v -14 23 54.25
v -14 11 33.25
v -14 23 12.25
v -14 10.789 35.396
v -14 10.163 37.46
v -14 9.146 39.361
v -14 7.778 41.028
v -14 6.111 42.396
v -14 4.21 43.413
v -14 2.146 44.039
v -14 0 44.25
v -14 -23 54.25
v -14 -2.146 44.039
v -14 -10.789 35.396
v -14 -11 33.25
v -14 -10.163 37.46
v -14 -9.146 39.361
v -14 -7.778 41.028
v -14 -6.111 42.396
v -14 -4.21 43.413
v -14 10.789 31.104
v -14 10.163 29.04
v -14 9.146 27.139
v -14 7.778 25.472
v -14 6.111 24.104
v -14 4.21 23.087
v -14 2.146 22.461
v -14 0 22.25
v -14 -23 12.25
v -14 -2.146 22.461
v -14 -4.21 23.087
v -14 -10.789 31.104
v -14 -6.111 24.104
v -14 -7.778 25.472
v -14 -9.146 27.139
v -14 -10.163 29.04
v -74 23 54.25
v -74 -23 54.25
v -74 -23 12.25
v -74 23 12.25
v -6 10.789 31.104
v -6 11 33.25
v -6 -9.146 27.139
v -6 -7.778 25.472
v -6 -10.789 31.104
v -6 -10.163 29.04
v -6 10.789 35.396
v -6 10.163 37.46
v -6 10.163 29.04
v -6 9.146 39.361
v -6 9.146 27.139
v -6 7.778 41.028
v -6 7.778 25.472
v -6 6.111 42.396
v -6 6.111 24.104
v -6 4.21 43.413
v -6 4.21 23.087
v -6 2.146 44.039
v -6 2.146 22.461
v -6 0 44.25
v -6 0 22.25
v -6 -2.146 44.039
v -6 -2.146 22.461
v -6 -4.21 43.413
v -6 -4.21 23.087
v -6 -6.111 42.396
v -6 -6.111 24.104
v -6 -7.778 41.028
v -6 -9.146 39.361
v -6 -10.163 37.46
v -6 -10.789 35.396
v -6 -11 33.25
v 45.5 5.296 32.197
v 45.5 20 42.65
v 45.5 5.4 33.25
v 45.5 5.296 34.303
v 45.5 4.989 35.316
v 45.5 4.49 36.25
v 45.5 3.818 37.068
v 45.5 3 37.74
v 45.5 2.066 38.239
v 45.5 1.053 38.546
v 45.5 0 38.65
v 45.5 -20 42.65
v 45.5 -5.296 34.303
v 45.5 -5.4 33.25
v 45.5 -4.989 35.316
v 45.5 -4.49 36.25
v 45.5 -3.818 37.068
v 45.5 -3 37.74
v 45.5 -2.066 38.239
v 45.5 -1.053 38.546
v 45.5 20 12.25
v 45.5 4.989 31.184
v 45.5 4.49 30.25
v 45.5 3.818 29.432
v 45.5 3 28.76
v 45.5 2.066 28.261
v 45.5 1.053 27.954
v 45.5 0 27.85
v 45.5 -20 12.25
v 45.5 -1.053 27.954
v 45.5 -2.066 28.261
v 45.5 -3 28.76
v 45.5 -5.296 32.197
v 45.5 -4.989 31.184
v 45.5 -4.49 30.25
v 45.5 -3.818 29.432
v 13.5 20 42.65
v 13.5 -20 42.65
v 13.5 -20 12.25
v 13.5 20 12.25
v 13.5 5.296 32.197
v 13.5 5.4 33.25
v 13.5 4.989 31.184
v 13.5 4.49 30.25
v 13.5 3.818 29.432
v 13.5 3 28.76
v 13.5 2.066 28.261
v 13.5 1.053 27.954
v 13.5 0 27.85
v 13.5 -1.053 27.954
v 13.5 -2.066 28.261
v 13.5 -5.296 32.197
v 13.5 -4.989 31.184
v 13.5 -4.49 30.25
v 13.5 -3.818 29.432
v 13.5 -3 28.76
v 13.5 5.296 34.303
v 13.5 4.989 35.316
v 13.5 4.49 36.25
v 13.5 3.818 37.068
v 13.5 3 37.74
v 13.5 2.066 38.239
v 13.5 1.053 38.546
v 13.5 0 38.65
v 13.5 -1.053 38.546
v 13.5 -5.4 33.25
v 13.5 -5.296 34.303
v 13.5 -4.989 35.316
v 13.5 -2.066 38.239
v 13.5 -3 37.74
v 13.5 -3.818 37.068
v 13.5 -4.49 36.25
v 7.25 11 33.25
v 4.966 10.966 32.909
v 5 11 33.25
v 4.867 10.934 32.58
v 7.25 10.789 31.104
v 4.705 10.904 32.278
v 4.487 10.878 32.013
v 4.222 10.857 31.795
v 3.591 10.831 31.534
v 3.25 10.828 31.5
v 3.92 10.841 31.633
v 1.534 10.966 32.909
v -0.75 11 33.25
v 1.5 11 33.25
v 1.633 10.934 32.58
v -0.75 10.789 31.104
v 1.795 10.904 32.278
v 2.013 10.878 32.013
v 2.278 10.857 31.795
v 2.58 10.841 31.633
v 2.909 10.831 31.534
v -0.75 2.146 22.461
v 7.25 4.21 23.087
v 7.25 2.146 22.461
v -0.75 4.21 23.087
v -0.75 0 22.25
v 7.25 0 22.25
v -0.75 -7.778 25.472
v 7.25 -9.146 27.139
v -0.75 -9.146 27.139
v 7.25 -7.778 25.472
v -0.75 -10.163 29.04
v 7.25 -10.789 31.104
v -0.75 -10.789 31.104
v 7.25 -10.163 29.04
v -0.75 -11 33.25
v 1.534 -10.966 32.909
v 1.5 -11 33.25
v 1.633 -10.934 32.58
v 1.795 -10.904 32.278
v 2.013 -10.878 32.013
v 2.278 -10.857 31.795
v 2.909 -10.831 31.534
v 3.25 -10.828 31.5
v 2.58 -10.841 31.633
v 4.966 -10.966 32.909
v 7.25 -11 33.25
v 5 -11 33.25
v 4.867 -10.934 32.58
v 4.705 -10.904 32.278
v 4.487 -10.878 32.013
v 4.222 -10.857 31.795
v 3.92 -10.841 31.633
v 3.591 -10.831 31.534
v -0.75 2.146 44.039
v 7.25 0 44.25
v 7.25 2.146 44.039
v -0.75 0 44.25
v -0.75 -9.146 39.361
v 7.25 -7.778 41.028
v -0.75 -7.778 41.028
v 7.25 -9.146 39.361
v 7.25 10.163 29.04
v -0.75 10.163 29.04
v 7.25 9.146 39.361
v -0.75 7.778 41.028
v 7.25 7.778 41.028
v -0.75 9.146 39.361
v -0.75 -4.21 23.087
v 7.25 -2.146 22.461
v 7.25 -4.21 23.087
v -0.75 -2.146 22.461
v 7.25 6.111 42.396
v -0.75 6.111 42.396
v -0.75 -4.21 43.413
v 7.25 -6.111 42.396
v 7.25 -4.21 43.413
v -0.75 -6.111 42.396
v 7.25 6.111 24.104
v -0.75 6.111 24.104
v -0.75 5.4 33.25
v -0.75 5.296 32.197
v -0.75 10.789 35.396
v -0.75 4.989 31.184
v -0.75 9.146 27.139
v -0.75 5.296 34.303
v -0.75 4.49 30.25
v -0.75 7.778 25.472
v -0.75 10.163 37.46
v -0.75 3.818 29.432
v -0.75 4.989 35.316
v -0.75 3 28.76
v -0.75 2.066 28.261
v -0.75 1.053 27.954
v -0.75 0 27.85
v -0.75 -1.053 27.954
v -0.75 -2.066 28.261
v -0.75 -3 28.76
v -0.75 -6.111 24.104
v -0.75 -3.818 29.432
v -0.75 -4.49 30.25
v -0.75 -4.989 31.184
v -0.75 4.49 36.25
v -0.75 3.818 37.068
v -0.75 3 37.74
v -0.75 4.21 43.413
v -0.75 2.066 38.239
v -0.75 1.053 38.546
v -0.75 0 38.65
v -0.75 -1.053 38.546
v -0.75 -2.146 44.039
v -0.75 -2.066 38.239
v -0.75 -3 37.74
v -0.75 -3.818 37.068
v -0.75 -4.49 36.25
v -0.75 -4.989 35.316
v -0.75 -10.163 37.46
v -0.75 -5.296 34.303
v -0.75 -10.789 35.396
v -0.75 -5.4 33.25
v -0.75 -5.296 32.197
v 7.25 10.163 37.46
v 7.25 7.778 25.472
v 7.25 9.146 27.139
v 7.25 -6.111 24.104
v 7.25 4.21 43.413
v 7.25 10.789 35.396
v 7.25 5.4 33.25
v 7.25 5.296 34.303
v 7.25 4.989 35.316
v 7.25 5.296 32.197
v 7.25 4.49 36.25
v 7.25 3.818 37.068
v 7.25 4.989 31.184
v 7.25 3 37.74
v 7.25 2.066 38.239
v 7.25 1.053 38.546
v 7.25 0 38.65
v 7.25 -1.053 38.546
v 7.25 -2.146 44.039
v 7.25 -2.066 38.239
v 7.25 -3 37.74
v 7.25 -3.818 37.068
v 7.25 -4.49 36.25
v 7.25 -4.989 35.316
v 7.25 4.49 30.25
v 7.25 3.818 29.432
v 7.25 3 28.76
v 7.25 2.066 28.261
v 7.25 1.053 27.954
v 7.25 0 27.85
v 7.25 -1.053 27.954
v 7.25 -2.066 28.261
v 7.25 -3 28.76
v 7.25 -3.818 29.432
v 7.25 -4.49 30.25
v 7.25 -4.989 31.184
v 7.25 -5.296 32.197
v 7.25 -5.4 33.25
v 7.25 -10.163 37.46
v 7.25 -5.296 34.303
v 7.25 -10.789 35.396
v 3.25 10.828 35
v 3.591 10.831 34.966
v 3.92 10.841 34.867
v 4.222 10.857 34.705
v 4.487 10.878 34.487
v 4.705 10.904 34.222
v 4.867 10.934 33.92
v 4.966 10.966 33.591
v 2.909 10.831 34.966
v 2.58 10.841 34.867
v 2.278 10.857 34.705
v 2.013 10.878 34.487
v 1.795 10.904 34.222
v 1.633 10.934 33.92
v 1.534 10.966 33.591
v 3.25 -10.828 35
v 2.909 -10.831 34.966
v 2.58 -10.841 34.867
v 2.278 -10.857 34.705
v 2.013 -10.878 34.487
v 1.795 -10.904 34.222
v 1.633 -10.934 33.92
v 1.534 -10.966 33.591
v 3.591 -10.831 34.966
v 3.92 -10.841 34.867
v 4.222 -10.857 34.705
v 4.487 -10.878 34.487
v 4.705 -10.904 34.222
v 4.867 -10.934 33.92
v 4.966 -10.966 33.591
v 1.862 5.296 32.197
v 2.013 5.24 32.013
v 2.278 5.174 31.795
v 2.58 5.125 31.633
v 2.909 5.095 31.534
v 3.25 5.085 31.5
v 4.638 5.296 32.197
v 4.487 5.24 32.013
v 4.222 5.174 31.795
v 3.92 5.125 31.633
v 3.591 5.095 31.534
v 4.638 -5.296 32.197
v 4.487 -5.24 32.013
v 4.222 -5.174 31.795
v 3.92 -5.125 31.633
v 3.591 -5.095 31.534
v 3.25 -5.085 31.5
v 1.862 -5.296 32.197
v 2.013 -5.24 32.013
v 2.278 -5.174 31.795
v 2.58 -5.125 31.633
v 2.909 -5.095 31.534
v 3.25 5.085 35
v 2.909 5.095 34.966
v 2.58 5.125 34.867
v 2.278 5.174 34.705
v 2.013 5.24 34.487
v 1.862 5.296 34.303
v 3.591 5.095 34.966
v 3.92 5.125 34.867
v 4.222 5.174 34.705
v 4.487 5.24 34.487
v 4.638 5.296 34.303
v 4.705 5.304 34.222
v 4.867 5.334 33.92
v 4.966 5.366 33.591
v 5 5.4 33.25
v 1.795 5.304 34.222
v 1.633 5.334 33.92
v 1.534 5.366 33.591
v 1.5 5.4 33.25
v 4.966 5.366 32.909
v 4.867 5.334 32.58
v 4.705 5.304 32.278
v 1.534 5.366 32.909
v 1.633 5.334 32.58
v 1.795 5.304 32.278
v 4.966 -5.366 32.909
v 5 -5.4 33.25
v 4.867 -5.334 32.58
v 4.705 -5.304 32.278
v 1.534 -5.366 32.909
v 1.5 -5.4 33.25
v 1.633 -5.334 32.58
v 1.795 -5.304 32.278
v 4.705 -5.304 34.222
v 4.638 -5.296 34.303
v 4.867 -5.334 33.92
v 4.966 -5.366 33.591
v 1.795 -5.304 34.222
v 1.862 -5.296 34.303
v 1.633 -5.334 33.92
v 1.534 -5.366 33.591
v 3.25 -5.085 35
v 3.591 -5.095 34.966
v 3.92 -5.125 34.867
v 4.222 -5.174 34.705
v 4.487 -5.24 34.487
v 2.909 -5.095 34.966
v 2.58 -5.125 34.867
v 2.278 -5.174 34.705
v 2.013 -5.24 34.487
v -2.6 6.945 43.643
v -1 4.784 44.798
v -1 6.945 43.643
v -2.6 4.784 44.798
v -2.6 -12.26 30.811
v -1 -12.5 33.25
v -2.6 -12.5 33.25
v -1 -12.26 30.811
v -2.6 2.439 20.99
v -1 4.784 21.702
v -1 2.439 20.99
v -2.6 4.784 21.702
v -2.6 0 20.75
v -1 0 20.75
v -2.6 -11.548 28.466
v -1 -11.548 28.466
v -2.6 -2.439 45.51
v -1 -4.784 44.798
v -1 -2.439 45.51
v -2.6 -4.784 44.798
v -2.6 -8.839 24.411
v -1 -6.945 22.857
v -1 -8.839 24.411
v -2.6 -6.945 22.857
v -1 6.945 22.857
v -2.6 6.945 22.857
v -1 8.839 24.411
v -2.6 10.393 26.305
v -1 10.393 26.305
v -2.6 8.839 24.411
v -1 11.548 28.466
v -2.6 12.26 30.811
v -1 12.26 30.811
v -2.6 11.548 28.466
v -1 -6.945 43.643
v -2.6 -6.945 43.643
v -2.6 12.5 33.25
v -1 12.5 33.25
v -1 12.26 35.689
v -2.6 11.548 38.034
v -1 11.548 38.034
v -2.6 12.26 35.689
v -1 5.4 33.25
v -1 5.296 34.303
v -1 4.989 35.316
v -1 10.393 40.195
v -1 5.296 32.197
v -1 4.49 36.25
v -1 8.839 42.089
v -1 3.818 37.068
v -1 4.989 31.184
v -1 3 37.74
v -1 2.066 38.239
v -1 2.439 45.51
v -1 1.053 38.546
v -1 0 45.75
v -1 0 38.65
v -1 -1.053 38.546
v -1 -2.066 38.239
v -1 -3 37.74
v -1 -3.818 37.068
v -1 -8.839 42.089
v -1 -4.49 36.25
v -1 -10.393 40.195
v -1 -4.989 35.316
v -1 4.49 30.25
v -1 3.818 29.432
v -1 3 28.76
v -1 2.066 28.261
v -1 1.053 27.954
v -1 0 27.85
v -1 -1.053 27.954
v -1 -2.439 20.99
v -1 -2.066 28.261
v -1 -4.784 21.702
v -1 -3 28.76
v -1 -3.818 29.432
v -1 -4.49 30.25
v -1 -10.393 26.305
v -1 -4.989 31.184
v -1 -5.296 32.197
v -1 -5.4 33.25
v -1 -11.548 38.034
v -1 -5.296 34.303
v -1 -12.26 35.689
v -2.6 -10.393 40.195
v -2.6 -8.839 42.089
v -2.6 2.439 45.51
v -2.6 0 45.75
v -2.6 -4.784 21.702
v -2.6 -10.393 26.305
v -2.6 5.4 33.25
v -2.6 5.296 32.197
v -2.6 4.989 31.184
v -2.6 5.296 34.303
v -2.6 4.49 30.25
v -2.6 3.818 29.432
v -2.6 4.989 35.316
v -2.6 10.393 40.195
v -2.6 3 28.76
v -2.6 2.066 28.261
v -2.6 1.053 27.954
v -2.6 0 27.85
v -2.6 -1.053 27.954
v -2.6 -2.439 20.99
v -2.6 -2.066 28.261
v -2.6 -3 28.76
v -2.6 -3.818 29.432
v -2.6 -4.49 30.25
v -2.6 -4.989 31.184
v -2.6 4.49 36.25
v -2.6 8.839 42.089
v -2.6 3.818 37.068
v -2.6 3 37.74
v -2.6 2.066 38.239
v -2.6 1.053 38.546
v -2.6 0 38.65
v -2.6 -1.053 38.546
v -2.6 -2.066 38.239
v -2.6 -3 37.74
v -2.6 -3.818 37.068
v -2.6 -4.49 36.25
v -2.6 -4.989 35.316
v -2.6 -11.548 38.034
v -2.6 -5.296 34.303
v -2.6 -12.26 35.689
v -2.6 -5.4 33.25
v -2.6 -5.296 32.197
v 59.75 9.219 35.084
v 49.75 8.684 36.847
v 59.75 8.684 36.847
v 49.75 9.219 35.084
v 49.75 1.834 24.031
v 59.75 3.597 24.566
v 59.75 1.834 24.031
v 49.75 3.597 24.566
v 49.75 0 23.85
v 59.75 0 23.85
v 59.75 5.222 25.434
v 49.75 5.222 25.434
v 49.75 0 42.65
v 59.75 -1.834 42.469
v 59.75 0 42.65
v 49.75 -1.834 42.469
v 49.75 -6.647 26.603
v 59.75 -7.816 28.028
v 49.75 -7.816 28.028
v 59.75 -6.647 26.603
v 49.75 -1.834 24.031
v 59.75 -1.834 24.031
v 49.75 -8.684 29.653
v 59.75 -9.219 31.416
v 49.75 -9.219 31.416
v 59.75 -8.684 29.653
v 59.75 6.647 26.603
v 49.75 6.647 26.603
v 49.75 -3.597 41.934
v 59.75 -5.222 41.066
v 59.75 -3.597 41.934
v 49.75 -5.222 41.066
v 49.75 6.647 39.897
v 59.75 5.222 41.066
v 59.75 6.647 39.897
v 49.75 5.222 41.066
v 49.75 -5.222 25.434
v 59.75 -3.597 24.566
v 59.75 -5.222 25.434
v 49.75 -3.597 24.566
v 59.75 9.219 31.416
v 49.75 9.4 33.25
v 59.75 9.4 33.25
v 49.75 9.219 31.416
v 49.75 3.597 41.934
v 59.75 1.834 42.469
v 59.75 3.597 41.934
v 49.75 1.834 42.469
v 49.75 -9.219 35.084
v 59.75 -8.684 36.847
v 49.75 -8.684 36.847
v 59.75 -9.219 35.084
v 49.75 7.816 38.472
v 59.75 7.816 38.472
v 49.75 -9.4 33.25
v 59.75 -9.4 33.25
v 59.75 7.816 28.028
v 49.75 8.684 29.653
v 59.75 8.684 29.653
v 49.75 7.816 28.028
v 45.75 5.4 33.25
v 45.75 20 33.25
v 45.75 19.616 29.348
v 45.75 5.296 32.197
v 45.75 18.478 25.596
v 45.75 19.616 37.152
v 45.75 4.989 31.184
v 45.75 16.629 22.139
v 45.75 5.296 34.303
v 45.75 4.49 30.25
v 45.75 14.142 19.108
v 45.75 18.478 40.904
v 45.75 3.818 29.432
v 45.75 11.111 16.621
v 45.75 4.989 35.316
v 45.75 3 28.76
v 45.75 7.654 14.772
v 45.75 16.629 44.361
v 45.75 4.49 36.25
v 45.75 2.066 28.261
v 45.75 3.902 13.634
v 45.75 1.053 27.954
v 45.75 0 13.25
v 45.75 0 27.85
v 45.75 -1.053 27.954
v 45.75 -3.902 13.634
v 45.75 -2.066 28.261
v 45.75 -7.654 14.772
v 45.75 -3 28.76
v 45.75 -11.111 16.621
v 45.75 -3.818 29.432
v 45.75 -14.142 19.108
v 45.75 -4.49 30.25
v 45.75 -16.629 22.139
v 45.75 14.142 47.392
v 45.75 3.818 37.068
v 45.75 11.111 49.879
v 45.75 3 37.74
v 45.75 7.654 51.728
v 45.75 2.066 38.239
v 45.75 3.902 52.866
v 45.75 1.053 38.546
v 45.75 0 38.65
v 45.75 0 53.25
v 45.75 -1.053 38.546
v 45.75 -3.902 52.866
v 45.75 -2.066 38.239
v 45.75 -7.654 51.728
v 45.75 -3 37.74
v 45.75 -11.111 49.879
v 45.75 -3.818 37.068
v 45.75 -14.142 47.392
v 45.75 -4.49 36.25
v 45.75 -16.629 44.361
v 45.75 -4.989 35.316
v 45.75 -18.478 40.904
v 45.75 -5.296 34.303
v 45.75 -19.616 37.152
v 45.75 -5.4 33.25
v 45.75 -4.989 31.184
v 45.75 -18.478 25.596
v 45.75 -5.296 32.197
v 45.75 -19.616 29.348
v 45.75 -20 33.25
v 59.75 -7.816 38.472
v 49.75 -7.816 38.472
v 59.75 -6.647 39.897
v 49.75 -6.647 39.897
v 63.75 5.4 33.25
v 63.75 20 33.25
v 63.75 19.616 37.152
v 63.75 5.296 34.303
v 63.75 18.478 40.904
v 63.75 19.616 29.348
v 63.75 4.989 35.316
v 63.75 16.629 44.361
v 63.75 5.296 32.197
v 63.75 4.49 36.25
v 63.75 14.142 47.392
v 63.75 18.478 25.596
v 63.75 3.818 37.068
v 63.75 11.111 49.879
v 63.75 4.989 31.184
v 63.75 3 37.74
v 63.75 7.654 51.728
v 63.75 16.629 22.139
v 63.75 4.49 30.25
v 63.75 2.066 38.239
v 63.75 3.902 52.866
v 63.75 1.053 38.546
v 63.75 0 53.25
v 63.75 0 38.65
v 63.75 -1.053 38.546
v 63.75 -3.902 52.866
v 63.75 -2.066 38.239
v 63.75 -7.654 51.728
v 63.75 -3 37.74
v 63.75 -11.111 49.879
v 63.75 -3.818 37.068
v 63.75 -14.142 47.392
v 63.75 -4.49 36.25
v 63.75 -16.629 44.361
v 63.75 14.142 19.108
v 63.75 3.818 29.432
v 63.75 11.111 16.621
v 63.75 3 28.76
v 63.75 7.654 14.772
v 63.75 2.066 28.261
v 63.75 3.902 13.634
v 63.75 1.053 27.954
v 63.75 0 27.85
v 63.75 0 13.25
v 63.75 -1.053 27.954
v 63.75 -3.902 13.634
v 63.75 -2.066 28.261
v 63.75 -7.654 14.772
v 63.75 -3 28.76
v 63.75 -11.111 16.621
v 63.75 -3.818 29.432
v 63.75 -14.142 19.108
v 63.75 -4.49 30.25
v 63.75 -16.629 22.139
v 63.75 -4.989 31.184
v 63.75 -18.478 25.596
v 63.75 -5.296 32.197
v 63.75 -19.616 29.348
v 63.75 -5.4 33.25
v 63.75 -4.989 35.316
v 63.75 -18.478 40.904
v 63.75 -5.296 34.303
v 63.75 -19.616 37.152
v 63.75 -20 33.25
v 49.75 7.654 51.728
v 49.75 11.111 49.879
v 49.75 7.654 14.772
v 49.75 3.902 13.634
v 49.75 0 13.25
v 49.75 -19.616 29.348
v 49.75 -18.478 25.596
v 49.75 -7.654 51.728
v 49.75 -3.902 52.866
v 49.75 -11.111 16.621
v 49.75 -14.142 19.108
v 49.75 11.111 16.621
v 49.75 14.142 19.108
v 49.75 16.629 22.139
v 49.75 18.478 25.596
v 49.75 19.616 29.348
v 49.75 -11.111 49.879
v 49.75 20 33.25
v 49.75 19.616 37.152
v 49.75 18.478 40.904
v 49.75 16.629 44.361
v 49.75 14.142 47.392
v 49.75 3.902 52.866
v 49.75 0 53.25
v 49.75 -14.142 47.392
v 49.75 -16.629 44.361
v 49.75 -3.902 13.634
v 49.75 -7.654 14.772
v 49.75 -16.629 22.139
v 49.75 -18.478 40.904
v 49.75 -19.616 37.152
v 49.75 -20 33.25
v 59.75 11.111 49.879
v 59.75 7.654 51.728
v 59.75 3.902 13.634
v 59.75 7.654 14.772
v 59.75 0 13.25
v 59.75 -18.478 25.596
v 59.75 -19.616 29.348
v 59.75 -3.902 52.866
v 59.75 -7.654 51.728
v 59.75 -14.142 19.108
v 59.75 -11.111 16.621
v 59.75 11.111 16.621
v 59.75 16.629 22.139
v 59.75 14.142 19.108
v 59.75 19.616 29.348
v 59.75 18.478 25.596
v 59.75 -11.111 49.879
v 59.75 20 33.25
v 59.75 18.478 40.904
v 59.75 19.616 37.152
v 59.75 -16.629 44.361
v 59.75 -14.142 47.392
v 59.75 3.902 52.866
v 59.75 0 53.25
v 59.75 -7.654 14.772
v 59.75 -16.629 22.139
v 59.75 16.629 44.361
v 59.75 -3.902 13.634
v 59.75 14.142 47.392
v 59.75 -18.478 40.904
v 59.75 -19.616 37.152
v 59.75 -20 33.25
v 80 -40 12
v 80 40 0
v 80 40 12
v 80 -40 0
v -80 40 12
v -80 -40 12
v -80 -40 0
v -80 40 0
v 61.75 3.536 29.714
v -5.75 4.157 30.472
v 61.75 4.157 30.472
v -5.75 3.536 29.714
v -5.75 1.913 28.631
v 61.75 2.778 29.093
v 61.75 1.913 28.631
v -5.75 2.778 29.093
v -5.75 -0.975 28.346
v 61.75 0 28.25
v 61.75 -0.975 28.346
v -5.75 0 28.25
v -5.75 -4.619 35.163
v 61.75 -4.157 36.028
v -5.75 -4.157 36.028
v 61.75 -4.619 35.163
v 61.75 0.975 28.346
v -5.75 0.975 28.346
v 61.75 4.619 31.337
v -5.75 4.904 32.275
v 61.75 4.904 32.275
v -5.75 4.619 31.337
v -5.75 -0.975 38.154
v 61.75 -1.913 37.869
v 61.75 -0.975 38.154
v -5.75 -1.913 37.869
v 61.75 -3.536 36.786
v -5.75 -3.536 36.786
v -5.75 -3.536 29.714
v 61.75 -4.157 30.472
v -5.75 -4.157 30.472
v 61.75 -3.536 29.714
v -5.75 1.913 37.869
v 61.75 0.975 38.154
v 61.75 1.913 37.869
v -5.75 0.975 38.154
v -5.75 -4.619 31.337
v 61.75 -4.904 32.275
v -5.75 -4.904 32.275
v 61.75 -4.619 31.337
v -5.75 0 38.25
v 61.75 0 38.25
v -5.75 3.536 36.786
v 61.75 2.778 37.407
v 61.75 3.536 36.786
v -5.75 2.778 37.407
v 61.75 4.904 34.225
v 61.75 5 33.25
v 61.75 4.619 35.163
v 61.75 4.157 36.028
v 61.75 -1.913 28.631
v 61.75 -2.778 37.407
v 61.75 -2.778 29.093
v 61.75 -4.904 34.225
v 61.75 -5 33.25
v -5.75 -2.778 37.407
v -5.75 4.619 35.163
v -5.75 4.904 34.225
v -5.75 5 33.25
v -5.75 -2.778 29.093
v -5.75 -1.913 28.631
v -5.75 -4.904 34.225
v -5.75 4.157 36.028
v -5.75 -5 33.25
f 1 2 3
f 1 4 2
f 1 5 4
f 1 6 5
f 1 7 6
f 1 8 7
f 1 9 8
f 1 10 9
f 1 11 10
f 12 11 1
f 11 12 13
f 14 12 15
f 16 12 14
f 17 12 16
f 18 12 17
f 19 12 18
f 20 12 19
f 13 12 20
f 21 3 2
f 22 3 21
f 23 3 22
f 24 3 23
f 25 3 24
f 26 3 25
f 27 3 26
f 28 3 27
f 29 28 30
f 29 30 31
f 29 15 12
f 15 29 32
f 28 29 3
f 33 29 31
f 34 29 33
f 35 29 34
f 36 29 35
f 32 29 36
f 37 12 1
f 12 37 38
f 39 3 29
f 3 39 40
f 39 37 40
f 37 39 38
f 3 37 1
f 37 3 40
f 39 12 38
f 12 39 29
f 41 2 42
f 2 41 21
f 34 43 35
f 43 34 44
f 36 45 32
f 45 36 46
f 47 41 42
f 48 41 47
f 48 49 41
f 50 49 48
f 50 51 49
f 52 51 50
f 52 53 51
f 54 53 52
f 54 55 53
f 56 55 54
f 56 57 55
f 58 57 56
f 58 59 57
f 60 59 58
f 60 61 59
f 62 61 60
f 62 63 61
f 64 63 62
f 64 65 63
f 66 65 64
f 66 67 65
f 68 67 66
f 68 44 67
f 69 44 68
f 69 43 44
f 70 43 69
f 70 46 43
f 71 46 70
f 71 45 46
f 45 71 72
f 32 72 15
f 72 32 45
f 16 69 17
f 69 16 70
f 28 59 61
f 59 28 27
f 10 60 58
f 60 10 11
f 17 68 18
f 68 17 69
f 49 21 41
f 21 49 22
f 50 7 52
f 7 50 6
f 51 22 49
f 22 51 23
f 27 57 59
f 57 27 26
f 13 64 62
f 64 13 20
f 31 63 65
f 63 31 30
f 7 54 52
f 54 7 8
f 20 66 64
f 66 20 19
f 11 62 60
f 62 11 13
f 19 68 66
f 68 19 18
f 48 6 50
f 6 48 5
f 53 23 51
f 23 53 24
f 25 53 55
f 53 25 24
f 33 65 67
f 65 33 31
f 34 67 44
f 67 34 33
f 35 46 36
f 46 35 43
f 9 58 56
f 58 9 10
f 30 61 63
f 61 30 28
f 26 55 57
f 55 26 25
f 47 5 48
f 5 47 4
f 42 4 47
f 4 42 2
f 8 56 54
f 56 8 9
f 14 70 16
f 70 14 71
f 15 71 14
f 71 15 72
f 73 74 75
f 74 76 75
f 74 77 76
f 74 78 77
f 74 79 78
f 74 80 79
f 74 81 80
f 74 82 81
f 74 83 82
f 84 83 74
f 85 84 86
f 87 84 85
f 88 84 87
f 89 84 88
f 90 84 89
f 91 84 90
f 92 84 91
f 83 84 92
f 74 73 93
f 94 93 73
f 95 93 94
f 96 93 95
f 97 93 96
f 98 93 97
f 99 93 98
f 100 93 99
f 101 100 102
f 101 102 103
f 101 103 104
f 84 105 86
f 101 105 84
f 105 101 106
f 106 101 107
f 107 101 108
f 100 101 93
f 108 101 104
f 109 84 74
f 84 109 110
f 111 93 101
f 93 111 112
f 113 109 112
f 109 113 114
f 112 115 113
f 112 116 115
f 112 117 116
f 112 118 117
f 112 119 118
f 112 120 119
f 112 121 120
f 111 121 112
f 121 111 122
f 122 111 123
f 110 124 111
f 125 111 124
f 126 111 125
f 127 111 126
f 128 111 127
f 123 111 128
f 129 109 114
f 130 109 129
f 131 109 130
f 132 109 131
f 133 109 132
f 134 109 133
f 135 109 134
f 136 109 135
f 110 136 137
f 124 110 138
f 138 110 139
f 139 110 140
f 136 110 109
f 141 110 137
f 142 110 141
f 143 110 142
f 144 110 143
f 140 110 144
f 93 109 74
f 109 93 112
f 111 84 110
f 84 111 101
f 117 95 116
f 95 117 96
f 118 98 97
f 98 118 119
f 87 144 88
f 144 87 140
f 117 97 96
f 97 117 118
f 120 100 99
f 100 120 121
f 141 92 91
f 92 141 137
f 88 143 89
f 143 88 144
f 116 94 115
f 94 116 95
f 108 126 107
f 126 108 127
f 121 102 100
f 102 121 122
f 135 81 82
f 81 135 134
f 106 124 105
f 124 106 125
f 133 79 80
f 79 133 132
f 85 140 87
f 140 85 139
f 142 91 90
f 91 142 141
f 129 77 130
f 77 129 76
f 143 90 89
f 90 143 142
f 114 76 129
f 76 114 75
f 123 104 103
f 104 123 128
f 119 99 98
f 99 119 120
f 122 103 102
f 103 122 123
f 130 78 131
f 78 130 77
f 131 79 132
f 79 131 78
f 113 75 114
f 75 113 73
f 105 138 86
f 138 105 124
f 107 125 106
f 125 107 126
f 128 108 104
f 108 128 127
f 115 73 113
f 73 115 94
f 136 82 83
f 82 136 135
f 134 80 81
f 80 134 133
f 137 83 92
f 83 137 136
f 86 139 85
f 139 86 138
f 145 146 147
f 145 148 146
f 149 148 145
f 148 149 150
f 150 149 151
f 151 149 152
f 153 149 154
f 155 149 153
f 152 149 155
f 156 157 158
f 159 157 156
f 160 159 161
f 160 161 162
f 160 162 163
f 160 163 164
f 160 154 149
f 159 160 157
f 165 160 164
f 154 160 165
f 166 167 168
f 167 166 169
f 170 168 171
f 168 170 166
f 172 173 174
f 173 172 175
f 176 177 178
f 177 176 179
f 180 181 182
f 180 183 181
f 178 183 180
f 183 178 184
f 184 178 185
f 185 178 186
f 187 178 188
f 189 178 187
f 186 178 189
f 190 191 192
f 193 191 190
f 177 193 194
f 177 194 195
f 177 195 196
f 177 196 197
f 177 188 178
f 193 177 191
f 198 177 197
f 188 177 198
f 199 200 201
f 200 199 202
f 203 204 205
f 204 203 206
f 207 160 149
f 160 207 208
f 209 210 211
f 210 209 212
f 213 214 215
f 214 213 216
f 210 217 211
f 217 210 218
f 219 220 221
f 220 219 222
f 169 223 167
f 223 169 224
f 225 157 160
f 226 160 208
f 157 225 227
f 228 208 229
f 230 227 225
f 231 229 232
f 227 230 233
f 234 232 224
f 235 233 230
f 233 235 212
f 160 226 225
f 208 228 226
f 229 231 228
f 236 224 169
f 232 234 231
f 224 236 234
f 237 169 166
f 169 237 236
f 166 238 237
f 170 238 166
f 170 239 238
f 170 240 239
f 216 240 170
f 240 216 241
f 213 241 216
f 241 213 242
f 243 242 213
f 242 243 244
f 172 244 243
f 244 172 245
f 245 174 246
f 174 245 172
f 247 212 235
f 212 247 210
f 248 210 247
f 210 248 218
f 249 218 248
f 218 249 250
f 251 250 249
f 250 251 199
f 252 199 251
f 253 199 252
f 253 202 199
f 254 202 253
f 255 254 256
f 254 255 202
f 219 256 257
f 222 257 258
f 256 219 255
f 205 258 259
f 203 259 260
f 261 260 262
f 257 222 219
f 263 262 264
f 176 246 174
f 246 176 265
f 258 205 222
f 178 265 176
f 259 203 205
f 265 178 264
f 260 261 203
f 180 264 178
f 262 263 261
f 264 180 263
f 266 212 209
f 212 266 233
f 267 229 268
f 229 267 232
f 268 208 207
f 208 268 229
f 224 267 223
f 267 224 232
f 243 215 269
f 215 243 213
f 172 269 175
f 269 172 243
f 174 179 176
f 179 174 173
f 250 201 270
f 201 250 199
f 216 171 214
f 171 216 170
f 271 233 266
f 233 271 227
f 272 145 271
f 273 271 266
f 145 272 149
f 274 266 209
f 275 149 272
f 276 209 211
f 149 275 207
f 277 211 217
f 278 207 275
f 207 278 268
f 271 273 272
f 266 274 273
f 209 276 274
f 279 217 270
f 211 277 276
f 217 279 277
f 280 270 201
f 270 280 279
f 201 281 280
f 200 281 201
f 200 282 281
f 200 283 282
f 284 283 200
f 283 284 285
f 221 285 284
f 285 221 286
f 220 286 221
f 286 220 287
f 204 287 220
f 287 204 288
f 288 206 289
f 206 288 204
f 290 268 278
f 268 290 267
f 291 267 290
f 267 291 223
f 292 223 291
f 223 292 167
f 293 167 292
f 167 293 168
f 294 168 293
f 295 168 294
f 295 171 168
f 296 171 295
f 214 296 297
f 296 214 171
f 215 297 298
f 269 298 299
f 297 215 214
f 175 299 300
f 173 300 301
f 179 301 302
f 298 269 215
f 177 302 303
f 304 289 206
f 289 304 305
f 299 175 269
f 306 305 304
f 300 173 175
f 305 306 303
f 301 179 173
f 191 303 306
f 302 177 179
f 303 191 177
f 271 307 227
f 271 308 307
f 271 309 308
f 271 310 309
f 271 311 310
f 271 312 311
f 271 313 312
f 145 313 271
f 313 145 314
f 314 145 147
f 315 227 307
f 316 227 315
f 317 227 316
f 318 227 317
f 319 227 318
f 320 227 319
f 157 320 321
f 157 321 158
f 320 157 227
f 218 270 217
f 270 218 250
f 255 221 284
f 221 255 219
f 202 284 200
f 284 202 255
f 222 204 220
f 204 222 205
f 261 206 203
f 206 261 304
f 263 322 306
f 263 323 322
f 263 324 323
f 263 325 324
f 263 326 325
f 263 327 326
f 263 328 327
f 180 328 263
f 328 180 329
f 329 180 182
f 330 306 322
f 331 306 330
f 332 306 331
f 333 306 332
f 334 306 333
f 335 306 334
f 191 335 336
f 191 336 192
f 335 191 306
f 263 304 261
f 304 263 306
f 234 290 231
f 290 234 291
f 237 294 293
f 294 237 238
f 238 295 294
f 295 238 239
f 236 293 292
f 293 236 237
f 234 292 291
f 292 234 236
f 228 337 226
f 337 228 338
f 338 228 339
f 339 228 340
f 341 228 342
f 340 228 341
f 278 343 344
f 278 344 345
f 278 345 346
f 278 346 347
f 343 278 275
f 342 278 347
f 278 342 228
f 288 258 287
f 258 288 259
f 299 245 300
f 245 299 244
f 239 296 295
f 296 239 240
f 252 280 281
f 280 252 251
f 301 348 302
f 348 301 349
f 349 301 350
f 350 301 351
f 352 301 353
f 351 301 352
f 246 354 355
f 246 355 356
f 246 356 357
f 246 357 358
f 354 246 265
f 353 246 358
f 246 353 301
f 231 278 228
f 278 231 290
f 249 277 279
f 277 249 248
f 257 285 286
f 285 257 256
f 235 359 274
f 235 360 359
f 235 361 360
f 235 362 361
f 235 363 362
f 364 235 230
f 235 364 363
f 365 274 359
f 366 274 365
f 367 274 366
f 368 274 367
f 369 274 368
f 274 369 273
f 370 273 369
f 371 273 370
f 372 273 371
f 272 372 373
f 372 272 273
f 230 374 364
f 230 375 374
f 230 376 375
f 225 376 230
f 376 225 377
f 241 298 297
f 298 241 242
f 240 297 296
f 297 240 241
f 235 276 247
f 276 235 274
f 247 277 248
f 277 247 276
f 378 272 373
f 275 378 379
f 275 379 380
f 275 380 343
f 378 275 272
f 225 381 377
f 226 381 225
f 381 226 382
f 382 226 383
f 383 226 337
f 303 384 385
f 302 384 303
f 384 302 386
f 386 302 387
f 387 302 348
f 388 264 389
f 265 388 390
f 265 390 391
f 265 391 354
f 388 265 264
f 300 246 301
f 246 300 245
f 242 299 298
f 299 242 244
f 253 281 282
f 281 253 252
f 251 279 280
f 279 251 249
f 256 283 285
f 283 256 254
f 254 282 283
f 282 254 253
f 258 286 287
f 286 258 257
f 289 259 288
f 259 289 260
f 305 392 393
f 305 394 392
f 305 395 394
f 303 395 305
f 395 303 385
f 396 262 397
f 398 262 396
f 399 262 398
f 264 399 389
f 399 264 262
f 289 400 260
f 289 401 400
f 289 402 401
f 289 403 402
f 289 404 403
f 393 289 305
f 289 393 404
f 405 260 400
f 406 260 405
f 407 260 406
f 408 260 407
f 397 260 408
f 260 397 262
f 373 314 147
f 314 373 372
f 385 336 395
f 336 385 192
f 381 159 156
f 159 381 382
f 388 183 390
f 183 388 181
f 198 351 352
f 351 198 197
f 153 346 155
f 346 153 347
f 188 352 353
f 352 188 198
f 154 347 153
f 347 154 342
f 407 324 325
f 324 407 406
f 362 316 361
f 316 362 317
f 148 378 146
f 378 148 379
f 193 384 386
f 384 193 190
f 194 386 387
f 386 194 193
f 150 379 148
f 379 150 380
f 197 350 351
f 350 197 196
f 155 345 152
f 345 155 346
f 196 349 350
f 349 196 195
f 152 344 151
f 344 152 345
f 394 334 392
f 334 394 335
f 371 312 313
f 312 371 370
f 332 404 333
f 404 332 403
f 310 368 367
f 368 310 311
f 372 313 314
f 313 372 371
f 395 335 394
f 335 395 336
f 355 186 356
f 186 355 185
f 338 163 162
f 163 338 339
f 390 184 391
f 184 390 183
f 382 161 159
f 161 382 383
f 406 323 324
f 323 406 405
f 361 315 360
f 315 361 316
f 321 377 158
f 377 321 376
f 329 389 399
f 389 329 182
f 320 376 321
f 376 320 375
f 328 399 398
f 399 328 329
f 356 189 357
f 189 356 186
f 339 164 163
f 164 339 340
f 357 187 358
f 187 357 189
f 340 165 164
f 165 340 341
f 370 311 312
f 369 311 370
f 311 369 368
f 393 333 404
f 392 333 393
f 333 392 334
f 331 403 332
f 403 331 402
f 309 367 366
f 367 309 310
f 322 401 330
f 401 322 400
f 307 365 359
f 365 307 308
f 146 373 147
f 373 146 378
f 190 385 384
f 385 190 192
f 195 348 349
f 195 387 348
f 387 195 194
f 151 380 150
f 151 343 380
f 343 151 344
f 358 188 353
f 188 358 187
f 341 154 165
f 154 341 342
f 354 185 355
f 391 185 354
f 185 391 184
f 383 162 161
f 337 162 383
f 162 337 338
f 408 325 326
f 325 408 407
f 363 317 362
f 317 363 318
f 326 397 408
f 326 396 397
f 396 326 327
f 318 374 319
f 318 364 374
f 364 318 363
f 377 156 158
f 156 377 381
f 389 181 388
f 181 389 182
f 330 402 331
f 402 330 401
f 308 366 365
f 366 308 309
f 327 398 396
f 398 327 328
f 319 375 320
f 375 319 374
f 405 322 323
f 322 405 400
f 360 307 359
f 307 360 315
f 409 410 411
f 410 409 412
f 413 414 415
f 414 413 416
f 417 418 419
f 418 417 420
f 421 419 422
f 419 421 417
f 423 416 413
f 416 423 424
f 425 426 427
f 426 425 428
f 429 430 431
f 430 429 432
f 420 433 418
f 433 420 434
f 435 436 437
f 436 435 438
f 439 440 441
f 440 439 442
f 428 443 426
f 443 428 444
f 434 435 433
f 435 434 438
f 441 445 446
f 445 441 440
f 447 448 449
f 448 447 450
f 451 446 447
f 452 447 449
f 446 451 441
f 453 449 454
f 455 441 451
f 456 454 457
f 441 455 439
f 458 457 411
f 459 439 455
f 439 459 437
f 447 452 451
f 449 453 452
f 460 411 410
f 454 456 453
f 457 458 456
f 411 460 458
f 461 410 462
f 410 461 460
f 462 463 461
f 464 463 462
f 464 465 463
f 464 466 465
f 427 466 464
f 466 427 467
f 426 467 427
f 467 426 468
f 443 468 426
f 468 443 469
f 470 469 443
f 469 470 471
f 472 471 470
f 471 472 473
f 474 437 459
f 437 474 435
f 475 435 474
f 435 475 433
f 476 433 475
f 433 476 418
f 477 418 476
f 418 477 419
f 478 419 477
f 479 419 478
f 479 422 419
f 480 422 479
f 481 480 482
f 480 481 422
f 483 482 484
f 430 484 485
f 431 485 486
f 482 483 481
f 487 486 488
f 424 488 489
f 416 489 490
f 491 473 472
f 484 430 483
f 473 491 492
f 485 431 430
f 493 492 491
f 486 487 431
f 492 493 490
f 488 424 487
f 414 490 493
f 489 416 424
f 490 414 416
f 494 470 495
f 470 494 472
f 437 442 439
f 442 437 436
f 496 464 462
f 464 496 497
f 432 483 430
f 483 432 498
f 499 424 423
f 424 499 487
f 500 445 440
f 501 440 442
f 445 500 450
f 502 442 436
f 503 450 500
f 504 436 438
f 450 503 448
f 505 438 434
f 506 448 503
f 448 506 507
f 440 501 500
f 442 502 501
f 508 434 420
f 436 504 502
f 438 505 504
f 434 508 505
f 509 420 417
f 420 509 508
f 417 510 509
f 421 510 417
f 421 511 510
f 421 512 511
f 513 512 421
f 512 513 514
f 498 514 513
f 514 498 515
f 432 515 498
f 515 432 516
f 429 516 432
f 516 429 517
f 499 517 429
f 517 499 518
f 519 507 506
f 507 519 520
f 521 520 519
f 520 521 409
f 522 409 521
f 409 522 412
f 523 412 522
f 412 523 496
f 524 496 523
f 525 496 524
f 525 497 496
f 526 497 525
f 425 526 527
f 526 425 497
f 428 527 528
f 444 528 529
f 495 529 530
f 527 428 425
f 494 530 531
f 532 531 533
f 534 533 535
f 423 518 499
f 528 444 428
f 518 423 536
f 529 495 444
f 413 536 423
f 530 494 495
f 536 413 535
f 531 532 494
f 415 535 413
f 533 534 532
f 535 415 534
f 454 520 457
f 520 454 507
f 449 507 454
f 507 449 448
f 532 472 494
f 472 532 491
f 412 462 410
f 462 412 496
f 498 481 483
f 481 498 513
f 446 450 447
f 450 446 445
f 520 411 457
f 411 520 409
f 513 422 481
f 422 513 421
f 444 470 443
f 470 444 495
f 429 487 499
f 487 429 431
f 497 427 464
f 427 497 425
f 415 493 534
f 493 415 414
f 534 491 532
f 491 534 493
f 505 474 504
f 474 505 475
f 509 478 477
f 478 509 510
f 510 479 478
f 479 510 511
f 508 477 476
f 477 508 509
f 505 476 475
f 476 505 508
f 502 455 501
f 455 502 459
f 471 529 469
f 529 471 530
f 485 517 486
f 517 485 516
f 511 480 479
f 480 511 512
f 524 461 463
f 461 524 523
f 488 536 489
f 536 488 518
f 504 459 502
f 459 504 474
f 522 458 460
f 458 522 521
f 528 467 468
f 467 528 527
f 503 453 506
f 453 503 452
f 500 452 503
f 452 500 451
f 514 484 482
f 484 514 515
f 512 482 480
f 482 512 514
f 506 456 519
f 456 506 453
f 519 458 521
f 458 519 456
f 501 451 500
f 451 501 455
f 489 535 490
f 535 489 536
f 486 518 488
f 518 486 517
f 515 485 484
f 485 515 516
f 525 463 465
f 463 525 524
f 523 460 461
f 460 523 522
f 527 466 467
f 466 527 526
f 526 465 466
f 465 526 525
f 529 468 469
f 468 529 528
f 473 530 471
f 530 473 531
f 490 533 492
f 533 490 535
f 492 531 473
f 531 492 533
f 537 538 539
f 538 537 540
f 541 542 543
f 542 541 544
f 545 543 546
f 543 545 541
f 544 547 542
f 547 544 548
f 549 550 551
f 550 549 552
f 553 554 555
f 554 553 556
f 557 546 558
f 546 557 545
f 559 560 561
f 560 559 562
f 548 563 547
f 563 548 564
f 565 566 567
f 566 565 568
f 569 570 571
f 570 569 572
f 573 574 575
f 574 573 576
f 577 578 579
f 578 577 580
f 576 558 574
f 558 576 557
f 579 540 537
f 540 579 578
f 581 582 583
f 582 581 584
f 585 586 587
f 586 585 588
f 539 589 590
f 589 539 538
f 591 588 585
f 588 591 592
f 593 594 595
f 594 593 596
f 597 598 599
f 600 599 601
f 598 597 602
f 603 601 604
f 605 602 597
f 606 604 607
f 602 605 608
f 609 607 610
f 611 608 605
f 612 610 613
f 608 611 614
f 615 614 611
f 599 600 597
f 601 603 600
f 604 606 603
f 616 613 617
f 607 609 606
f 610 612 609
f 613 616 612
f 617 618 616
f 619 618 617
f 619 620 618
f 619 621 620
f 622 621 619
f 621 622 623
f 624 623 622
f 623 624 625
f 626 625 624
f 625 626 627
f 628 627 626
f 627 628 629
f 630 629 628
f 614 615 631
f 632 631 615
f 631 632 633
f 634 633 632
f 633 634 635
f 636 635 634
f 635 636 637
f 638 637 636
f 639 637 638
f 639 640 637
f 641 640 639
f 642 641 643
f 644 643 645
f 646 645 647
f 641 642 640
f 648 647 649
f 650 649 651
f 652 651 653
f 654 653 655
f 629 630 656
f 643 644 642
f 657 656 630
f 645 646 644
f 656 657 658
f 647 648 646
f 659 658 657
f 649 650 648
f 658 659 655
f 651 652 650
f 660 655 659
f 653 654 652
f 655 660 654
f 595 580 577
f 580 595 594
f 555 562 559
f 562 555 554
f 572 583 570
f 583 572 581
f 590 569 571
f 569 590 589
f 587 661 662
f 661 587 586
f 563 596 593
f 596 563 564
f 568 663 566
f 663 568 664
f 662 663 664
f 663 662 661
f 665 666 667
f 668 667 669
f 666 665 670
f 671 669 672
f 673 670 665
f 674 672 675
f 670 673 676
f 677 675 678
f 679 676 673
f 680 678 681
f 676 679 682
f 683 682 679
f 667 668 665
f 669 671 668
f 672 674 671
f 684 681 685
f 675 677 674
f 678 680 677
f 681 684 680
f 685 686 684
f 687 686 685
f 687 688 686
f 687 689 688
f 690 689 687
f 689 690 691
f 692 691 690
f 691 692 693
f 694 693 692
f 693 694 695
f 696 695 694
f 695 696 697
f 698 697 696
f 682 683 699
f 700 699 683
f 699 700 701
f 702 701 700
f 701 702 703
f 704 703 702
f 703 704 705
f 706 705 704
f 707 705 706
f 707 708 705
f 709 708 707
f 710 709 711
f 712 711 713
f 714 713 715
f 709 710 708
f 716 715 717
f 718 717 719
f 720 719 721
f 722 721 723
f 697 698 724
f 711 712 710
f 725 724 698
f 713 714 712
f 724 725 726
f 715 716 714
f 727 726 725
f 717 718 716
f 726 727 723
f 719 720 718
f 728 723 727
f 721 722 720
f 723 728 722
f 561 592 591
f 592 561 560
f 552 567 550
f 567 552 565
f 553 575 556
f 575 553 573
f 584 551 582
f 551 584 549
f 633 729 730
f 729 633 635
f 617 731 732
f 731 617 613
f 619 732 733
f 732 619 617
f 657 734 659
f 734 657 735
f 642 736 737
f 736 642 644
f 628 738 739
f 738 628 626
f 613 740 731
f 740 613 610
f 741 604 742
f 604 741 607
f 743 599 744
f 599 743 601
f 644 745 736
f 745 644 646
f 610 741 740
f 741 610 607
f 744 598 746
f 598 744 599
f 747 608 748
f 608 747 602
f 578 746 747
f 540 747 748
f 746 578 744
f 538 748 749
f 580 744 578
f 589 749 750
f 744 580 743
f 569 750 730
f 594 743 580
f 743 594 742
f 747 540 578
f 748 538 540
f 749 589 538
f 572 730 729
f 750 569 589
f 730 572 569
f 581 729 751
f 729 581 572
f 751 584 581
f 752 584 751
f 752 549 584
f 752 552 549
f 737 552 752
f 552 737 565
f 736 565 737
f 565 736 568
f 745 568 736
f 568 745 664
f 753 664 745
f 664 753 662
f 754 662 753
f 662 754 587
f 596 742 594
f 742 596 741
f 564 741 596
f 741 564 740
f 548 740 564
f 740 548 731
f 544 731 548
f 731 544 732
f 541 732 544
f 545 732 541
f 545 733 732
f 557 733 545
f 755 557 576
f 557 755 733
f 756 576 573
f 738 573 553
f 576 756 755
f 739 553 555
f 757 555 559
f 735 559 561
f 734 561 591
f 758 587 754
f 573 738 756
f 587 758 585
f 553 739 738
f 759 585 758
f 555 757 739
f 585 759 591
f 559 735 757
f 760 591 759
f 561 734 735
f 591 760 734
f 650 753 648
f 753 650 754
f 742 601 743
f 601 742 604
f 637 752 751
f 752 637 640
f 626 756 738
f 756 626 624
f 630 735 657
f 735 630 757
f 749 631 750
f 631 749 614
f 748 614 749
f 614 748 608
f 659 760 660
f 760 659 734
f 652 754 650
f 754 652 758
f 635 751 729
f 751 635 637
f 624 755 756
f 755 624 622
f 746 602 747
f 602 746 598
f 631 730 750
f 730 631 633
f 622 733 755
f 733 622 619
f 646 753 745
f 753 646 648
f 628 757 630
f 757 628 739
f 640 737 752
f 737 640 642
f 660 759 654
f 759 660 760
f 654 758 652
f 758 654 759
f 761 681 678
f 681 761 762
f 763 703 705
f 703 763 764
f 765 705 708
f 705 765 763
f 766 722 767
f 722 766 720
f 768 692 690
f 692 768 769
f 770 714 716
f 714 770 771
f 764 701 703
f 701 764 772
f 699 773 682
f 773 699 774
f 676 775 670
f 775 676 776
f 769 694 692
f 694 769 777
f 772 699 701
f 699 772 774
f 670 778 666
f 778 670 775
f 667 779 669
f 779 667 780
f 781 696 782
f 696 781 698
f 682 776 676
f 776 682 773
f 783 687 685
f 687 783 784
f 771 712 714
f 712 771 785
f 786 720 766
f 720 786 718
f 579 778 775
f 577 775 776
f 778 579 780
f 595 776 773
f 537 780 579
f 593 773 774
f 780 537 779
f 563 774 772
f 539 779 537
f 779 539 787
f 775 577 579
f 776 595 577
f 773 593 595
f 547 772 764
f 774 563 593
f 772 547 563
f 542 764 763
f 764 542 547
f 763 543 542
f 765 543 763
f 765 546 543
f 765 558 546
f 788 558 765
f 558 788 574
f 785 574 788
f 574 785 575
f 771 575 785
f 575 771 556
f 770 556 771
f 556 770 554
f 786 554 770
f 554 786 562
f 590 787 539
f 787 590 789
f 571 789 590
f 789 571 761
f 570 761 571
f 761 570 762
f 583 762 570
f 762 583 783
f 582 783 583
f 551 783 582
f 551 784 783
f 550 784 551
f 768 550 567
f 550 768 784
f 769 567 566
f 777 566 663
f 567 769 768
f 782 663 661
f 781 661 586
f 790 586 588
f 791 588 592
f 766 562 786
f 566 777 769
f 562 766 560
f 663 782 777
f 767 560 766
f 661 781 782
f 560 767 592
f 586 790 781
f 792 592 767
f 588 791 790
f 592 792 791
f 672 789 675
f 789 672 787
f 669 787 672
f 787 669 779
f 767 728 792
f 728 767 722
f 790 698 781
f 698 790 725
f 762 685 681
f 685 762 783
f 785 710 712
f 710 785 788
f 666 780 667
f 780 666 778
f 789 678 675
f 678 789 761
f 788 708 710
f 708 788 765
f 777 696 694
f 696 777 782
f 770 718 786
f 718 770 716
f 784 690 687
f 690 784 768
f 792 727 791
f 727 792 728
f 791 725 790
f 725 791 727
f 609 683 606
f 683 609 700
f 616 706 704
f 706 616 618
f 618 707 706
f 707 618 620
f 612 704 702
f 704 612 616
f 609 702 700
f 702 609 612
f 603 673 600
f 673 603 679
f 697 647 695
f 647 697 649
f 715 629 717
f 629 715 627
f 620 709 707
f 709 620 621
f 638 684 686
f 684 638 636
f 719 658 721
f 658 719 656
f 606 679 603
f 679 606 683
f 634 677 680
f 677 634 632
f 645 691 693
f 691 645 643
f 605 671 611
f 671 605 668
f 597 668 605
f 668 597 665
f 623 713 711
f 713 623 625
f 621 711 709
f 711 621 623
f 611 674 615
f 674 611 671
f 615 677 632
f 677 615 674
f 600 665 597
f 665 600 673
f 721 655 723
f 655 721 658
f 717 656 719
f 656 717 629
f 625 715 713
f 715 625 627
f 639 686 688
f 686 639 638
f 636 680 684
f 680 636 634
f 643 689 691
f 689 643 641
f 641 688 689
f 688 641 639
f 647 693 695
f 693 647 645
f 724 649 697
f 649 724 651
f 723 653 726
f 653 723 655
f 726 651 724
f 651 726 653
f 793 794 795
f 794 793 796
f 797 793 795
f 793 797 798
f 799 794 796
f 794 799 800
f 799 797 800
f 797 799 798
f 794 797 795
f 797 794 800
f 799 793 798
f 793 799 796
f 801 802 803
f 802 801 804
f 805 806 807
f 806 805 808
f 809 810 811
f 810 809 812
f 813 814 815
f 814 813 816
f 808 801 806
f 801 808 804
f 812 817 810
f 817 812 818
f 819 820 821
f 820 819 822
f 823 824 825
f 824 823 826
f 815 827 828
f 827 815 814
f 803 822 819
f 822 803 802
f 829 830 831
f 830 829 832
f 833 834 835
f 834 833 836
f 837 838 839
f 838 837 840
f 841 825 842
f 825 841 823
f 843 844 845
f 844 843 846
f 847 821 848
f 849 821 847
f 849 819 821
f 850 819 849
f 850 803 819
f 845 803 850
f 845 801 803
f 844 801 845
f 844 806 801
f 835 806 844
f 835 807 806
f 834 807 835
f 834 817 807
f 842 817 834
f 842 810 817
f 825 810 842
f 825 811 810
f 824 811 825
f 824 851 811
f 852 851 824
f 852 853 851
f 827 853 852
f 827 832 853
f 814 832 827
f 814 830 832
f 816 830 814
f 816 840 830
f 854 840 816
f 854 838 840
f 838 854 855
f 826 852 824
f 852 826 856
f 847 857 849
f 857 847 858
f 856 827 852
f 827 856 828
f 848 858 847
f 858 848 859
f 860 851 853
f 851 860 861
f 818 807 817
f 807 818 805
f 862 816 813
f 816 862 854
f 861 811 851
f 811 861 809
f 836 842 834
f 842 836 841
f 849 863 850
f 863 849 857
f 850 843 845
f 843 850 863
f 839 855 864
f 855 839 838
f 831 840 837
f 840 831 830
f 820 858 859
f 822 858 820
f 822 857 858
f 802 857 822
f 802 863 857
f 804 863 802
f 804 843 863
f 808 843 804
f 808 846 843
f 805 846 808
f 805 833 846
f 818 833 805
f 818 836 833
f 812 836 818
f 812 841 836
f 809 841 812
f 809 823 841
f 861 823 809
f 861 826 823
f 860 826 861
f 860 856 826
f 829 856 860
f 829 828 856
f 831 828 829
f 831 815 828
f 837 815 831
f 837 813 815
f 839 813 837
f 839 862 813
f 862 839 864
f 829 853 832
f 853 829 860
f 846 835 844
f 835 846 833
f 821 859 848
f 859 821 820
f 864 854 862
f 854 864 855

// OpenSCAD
$fn = 32;

// ------------------------------------------------------------------------
// Motor drive station: motor 60 x 42 mm, shaft d10, pulley d40
// Every part is its own module, assembly() places every instance.
// ------------------------------------------------------------------------

// --- part 1 ---
module station_bed() {
  difference() {
    translate([-80, -40, 0]) cube([160, 80, 12]);
  }
}

// --- part 2 ---
module drive_motor() {
  union() {
    translate([-30, -23, 0]) cube([60, 46, 42]);
    translate([34, 0, 21]) rotate([0, 90, 0]) cylinder(h = 8, d = 22, center = true);
  }
}

// --- part 3 ---
module pillow_block() {
  difference() {
    translate([-16, -20, 0]) cube([32, 40, 30.4]);
    translate([0, 0, 21]) rotate([0, 90, 0]) cylinder(h = 34, d = 10.8, center = true);
  }
}

// --- part 4 ---
module drive_shaft() {
  translate([0, 0, -33.75]) cylinder(h = 67.5, d = 10);
}

// --- part 5 ---
module shaft_collar() {
  difference() {
    cylinder(h = 8, d = 22);
    translate([0, 0, -1]) cylinder(h = 10, d = 10.8);
    translate([0, 0, 4]) rotate([90, 0, 0]) cylinder(h = 24, d = 3.5, center = true);
  }
}

// --- part 6 ---
module collar_washer() {
  difference() {
      translate([0, 0, 0]) cylinder(h = 1.6, d = 25);
      translate([0, 0, -1]) cylinder(h = 3.6, d = 10.8);
    }
}

// --- part 7 ---
module drive_pulley() {
  difference() {
    union() {
      cylinder(h = 18, d = 18.8);
      cylinder(h = 4, d = 40);
      translate([0, 0, 14]) cylinder(h = 4, d = 40);
    }
    translate([0, 0, -1]) cylinder(h = 20, d = 10.8);
  }
}

// --- assembly ---
module assembly() {
  color([0.80, 0.24, 0.20]) translate([0, 0, 0]) rotate([0, 0, 0]) station_bed();
  color([0.20, 0.45, 0.75]) translate([-44, 0, 12.25]) rotate([0, 0, 0]) drive_motor();
  color([0.25, 0.62, 0.32]) translate([29.5, 0, 12.25]) rotate([0, 0, 0]) pillow_block();
  color([0.92, 0.70, 0.18]) translate([28, 0, 33.25]) rotate([0, 90, 0]) drive_shaft();
  color([0.58, 0.35, 0.70]) translate([-0.75, 0, 33.25]) rotate([0, 90, 0]) shaft_collar();
  color([0.16, 0.66, 0.66]) translate([-2.6, 0, 33.25]) rotate([0, 90, 0]) collar_washer();
  color([0.85, 0.48, 0.18]) translate([45.75, 0, 33.25]) rotate([0, 90, 0]) drive_pulley();
}

assembly();
